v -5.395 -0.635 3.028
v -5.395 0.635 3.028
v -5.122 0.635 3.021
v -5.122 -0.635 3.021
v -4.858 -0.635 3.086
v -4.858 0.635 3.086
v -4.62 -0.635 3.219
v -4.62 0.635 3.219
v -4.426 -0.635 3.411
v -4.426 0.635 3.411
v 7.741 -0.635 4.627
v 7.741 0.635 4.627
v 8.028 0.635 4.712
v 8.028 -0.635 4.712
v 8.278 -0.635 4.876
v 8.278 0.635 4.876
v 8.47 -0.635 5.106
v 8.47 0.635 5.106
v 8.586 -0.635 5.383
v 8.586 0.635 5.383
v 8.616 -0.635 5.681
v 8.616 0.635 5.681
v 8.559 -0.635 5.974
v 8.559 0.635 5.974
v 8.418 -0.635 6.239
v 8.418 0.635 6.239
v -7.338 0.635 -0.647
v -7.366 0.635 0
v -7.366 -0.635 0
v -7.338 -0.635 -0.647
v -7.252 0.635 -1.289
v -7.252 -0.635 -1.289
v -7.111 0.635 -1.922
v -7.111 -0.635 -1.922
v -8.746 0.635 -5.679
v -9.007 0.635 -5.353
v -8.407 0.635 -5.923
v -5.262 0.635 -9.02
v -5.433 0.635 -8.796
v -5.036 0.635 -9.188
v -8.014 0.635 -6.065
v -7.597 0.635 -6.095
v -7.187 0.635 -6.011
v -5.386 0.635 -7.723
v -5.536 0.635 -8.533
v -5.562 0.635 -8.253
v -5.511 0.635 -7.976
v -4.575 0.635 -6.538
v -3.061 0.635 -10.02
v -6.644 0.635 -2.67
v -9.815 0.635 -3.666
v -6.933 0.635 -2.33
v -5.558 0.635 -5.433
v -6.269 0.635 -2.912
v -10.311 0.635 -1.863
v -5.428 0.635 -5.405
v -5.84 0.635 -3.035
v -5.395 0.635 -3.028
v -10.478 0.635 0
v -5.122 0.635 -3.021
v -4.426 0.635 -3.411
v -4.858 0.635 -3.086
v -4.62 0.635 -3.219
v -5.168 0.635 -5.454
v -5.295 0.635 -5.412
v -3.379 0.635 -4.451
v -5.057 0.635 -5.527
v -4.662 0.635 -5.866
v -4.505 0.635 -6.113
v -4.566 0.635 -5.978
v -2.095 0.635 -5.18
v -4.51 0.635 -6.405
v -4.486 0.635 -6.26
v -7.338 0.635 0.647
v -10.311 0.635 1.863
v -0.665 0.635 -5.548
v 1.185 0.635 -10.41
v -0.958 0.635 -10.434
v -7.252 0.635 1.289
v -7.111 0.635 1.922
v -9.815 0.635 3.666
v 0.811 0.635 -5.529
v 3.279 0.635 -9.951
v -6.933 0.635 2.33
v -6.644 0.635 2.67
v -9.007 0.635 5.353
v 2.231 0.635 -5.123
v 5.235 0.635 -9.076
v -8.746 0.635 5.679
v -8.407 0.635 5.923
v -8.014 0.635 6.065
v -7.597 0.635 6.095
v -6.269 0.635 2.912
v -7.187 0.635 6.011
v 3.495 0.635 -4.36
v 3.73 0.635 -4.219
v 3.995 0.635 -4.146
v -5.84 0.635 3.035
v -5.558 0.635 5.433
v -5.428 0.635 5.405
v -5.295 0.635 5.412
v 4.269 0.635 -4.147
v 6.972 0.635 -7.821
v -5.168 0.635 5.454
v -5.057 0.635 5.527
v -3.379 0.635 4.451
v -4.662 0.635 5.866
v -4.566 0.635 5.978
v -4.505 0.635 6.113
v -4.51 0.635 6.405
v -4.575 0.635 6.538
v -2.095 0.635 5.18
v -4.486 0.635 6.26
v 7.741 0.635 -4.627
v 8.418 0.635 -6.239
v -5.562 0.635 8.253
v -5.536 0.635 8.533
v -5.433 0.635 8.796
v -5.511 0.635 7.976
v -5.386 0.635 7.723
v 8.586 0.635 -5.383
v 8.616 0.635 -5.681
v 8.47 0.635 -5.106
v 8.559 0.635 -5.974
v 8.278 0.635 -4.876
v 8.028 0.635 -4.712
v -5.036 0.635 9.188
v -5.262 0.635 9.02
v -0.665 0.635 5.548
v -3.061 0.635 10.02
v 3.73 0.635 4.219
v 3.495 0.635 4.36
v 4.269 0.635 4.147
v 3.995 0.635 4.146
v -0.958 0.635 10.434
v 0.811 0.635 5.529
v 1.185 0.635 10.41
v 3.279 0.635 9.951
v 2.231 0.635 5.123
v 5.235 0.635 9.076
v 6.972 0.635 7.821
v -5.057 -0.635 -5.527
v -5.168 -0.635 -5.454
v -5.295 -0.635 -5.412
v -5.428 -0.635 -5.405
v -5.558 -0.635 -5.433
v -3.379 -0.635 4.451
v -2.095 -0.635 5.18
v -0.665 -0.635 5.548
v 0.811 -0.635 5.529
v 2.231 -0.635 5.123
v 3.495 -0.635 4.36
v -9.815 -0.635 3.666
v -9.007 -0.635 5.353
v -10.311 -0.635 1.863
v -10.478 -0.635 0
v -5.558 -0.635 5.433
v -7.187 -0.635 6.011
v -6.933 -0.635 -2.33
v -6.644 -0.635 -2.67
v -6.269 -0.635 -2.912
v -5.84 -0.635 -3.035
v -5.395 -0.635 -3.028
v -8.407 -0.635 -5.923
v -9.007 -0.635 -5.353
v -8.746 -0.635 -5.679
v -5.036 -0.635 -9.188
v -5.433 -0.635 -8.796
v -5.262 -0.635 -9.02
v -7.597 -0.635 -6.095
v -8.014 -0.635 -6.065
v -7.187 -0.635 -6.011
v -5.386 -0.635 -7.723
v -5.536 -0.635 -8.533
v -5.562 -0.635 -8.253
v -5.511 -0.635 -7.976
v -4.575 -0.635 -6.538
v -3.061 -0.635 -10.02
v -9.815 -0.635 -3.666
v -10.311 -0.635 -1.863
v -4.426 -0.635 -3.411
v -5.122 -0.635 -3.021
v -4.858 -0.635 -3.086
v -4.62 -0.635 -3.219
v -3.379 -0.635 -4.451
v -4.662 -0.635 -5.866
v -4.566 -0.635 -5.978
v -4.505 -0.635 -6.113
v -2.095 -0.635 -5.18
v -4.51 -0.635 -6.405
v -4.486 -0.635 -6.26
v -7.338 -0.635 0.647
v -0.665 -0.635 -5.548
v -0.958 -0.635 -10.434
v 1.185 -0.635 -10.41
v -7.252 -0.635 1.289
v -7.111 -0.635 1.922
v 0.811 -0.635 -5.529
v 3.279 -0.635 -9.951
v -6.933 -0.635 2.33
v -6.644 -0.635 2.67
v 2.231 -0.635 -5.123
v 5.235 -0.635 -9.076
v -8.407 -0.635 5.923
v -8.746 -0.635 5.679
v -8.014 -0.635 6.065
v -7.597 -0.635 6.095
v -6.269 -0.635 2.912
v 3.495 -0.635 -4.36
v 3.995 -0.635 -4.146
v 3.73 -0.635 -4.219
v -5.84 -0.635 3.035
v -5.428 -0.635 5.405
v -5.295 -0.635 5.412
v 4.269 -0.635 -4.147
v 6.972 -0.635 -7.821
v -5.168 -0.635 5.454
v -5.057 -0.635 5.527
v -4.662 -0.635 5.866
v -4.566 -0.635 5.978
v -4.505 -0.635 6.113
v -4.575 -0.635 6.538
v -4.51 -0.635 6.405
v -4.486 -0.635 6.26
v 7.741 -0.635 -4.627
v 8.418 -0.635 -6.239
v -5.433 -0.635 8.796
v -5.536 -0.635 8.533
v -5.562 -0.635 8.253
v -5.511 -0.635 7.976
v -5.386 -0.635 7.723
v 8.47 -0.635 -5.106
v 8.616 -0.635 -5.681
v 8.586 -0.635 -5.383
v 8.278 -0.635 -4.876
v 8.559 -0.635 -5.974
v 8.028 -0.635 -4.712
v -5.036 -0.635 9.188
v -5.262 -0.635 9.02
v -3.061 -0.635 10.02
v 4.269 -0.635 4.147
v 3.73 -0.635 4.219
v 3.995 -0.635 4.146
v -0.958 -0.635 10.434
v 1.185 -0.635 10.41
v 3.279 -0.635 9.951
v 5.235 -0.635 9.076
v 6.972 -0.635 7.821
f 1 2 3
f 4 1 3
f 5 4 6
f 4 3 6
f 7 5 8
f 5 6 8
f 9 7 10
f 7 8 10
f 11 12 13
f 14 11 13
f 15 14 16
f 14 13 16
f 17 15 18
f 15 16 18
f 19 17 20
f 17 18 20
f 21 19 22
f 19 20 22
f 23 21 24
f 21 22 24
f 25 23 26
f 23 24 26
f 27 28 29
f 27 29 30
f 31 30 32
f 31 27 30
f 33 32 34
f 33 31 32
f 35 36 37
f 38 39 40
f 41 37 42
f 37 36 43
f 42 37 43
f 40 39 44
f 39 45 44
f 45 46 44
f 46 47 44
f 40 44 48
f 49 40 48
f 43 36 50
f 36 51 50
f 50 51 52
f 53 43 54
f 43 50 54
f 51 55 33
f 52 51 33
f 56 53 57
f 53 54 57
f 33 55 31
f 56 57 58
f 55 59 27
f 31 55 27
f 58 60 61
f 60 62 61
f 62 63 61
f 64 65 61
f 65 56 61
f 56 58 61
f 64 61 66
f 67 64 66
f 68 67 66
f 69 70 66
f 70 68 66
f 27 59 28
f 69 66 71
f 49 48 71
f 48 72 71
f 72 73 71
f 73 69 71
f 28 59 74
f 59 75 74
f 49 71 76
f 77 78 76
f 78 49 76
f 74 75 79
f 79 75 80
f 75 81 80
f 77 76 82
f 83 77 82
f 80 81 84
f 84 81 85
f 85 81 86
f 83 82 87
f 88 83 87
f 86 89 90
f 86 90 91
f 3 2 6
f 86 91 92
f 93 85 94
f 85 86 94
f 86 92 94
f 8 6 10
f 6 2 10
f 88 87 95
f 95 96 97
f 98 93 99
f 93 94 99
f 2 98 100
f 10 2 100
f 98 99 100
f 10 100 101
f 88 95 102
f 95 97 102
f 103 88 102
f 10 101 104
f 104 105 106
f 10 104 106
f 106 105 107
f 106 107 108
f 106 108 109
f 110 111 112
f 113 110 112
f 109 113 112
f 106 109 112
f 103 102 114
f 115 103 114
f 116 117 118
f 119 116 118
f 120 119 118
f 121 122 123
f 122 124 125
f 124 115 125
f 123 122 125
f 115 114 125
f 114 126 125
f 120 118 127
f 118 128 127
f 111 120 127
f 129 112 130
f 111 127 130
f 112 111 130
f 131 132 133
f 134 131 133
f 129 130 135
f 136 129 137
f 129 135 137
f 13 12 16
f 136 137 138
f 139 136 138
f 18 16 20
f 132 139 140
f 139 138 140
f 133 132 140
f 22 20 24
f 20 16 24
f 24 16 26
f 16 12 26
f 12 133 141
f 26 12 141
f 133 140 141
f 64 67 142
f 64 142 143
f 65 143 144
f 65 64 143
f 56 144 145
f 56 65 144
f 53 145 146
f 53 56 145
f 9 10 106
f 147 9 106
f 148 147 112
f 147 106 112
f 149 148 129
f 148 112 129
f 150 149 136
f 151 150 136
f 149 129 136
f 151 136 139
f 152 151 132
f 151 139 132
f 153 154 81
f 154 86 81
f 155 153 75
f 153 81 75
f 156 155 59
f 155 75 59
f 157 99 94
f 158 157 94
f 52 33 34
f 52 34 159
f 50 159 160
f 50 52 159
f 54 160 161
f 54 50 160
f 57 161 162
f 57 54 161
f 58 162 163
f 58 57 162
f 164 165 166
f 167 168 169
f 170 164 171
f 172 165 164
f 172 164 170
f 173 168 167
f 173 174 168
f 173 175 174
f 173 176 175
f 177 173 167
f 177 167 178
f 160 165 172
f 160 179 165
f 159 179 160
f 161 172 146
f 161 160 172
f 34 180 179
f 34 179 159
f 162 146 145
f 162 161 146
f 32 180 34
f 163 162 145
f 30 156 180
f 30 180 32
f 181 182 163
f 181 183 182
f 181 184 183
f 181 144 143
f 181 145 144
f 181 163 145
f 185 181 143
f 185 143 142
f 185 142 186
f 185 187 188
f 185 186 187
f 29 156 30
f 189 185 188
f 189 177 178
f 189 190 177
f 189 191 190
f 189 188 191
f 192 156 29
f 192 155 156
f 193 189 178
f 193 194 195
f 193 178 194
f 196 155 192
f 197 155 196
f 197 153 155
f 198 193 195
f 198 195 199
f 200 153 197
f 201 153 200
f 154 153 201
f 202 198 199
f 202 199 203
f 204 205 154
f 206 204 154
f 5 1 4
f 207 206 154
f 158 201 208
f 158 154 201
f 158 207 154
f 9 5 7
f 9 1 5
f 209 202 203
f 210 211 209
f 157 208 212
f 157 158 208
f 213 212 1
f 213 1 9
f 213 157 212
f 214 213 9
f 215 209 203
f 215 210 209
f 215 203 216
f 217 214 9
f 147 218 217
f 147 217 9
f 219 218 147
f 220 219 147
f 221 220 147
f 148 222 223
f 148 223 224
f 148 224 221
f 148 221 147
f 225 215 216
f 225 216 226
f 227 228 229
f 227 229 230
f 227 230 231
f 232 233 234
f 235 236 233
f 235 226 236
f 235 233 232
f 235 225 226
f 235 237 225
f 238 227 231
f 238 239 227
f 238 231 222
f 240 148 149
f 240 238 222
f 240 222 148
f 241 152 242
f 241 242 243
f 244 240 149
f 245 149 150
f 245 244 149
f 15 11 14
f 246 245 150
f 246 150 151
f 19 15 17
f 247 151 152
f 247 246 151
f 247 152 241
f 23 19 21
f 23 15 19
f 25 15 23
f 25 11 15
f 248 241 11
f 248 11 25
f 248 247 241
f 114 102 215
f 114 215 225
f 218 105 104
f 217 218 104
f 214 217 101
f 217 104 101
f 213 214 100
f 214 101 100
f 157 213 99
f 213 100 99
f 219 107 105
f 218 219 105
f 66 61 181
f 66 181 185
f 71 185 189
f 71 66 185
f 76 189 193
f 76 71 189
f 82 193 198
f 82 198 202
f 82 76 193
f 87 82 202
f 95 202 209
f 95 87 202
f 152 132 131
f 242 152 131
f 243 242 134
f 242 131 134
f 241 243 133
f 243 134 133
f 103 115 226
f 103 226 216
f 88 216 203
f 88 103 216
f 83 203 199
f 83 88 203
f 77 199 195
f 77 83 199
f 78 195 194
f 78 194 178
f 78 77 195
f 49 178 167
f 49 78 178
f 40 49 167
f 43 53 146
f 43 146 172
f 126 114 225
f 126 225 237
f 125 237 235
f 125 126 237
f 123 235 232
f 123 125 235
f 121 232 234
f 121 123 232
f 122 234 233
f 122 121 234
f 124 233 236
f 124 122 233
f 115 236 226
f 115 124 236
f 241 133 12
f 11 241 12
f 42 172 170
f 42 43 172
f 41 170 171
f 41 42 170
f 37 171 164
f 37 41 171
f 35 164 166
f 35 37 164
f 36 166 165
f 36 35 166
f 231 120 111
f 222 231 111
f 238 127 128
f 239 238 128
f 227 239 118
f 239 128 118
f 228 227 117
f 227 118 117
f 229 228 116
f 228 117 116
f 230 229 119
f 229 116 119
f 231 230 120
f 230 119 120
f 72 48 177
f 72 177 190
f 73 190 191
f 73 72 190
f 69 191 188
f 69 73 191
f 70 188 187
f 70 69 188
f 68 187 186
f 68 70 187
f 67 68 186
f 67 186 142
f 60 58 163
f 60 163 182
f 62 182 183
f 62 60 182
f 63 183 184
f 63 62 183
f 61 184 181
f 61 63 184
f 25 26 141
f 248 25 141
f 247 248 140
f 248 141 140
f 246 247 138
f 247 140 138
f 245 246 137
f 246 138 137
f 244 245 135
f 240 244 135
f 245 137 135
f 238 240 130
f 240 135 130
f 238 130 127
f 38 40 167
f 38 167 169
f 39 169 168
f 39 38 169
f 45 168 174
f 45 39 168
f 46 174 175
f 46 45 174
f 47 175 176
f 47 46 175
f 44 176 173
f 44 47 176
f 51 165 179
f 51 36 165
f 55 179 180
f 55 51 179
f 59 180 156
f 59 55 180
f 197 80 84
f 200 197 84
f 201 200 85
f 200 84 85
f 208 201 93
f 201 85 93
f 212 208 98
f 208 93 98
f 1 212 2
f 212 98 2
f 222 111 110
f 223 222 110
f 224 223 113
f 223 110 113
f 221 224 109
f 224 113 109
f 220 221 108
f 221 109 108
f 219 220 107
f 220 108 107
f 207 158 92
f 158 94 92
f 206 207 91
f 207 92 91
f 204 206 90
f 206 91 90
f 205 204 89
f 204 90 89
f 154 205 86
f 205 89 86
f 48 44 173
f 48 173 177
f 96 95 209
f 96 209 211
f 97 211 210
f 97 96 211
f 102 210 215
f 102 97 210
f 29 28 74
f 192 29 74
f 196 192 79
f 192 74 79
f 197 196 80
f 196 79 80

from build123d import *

# Parameters (mm, degrees)
EXTRUDE1_DEPTH = 0.635


with BuildPart() as part:
    # Sketch1 → Extrude1 (new, symmetric)
    with BuildSketch(Plane(origin=(0, 0, 0), x_dir=(1, 0, 0), z_dir=(0, 1, 0))):
        with BuildLine():
            Line((-10.4775, 0), (-7.366, 0))
            ThreePointArc((-7.366, 0), (-7.301957926, 0.969209186), (-7.110945304, 1.921565217))
            ThreePointArc((-7.110945304, 1.921565217), (-6.465513716, 2.804871922), (-5.394551993, 3.02815125))
            ThreePointArc((-5.394551993, 3.02815125), (-4.857704937, 3.086024688), (-4.426323701, 3.410777403))
            ThreePointArc((-4.426323701, 3.410777403), (-0.665227036, 5.54826252), (3.494563676, 4.360478037))
            ThreePointArc((3.494563676, 4.360478037), (3.859883441, 4.17384031), (4.269231255, 4.146885928))
            Line((4.269231255, 4.146885928), (7.740657974, 4.627351162))
            ThreePointArc((7.740657974, 4.627351162), (8.538061077, 5.240237956), (8.417619634, 6.238724705))
            ThreePointArc((8.417619634, 6.238724705), (2.243656673, 10.234452158), (-5.035674849, 9.188034886))
            ThreePointArc((-5.035674849, 9.188034886), (-5.535533941, 8.533256201), (-5.38578247, 7.723213774))
            Line((-5.38578247, 7.723213774), (-4.574680298, 6.538185302))
            ThreePointArc((-4.574680298, 6.538185302), (-4.490147686, 6.185607258), (-4.662218923, 5.866470095))
            Line((-4.662218923, 5.866470095), (-5.056506744, 5.526610046))
            ThreePointArc((-5.056506744, 5.526610046), (-5.294597853, 5.412088501), (-5.558000453, 5.432622154))
            Line((-5.558000453, 5.432622154), (-7.187368065, 6.010571783))
            ThreePointArc((-7.187368065, 6.010571783), (-8.214915896, 6.007492148), (-9.006942583, 5.35284892))
            ThreePointArc((-9.006942583, 5.35284892), (-10.103173936, 2.775586905), (-10.4775, 0))
        make_face()
    extrude(amount=EXTRUDE1_DEPTH, both=True)

    # Mirror1: part across plane


with BuildPart() as part_1:
    add(part.part)
    add(part.part.mirror(Plane(origin=(-10.4775, 0.635, 0), x_dir=(1, 0, 0), z_dir=(0, 0, -1))))


solid = part_1.part
